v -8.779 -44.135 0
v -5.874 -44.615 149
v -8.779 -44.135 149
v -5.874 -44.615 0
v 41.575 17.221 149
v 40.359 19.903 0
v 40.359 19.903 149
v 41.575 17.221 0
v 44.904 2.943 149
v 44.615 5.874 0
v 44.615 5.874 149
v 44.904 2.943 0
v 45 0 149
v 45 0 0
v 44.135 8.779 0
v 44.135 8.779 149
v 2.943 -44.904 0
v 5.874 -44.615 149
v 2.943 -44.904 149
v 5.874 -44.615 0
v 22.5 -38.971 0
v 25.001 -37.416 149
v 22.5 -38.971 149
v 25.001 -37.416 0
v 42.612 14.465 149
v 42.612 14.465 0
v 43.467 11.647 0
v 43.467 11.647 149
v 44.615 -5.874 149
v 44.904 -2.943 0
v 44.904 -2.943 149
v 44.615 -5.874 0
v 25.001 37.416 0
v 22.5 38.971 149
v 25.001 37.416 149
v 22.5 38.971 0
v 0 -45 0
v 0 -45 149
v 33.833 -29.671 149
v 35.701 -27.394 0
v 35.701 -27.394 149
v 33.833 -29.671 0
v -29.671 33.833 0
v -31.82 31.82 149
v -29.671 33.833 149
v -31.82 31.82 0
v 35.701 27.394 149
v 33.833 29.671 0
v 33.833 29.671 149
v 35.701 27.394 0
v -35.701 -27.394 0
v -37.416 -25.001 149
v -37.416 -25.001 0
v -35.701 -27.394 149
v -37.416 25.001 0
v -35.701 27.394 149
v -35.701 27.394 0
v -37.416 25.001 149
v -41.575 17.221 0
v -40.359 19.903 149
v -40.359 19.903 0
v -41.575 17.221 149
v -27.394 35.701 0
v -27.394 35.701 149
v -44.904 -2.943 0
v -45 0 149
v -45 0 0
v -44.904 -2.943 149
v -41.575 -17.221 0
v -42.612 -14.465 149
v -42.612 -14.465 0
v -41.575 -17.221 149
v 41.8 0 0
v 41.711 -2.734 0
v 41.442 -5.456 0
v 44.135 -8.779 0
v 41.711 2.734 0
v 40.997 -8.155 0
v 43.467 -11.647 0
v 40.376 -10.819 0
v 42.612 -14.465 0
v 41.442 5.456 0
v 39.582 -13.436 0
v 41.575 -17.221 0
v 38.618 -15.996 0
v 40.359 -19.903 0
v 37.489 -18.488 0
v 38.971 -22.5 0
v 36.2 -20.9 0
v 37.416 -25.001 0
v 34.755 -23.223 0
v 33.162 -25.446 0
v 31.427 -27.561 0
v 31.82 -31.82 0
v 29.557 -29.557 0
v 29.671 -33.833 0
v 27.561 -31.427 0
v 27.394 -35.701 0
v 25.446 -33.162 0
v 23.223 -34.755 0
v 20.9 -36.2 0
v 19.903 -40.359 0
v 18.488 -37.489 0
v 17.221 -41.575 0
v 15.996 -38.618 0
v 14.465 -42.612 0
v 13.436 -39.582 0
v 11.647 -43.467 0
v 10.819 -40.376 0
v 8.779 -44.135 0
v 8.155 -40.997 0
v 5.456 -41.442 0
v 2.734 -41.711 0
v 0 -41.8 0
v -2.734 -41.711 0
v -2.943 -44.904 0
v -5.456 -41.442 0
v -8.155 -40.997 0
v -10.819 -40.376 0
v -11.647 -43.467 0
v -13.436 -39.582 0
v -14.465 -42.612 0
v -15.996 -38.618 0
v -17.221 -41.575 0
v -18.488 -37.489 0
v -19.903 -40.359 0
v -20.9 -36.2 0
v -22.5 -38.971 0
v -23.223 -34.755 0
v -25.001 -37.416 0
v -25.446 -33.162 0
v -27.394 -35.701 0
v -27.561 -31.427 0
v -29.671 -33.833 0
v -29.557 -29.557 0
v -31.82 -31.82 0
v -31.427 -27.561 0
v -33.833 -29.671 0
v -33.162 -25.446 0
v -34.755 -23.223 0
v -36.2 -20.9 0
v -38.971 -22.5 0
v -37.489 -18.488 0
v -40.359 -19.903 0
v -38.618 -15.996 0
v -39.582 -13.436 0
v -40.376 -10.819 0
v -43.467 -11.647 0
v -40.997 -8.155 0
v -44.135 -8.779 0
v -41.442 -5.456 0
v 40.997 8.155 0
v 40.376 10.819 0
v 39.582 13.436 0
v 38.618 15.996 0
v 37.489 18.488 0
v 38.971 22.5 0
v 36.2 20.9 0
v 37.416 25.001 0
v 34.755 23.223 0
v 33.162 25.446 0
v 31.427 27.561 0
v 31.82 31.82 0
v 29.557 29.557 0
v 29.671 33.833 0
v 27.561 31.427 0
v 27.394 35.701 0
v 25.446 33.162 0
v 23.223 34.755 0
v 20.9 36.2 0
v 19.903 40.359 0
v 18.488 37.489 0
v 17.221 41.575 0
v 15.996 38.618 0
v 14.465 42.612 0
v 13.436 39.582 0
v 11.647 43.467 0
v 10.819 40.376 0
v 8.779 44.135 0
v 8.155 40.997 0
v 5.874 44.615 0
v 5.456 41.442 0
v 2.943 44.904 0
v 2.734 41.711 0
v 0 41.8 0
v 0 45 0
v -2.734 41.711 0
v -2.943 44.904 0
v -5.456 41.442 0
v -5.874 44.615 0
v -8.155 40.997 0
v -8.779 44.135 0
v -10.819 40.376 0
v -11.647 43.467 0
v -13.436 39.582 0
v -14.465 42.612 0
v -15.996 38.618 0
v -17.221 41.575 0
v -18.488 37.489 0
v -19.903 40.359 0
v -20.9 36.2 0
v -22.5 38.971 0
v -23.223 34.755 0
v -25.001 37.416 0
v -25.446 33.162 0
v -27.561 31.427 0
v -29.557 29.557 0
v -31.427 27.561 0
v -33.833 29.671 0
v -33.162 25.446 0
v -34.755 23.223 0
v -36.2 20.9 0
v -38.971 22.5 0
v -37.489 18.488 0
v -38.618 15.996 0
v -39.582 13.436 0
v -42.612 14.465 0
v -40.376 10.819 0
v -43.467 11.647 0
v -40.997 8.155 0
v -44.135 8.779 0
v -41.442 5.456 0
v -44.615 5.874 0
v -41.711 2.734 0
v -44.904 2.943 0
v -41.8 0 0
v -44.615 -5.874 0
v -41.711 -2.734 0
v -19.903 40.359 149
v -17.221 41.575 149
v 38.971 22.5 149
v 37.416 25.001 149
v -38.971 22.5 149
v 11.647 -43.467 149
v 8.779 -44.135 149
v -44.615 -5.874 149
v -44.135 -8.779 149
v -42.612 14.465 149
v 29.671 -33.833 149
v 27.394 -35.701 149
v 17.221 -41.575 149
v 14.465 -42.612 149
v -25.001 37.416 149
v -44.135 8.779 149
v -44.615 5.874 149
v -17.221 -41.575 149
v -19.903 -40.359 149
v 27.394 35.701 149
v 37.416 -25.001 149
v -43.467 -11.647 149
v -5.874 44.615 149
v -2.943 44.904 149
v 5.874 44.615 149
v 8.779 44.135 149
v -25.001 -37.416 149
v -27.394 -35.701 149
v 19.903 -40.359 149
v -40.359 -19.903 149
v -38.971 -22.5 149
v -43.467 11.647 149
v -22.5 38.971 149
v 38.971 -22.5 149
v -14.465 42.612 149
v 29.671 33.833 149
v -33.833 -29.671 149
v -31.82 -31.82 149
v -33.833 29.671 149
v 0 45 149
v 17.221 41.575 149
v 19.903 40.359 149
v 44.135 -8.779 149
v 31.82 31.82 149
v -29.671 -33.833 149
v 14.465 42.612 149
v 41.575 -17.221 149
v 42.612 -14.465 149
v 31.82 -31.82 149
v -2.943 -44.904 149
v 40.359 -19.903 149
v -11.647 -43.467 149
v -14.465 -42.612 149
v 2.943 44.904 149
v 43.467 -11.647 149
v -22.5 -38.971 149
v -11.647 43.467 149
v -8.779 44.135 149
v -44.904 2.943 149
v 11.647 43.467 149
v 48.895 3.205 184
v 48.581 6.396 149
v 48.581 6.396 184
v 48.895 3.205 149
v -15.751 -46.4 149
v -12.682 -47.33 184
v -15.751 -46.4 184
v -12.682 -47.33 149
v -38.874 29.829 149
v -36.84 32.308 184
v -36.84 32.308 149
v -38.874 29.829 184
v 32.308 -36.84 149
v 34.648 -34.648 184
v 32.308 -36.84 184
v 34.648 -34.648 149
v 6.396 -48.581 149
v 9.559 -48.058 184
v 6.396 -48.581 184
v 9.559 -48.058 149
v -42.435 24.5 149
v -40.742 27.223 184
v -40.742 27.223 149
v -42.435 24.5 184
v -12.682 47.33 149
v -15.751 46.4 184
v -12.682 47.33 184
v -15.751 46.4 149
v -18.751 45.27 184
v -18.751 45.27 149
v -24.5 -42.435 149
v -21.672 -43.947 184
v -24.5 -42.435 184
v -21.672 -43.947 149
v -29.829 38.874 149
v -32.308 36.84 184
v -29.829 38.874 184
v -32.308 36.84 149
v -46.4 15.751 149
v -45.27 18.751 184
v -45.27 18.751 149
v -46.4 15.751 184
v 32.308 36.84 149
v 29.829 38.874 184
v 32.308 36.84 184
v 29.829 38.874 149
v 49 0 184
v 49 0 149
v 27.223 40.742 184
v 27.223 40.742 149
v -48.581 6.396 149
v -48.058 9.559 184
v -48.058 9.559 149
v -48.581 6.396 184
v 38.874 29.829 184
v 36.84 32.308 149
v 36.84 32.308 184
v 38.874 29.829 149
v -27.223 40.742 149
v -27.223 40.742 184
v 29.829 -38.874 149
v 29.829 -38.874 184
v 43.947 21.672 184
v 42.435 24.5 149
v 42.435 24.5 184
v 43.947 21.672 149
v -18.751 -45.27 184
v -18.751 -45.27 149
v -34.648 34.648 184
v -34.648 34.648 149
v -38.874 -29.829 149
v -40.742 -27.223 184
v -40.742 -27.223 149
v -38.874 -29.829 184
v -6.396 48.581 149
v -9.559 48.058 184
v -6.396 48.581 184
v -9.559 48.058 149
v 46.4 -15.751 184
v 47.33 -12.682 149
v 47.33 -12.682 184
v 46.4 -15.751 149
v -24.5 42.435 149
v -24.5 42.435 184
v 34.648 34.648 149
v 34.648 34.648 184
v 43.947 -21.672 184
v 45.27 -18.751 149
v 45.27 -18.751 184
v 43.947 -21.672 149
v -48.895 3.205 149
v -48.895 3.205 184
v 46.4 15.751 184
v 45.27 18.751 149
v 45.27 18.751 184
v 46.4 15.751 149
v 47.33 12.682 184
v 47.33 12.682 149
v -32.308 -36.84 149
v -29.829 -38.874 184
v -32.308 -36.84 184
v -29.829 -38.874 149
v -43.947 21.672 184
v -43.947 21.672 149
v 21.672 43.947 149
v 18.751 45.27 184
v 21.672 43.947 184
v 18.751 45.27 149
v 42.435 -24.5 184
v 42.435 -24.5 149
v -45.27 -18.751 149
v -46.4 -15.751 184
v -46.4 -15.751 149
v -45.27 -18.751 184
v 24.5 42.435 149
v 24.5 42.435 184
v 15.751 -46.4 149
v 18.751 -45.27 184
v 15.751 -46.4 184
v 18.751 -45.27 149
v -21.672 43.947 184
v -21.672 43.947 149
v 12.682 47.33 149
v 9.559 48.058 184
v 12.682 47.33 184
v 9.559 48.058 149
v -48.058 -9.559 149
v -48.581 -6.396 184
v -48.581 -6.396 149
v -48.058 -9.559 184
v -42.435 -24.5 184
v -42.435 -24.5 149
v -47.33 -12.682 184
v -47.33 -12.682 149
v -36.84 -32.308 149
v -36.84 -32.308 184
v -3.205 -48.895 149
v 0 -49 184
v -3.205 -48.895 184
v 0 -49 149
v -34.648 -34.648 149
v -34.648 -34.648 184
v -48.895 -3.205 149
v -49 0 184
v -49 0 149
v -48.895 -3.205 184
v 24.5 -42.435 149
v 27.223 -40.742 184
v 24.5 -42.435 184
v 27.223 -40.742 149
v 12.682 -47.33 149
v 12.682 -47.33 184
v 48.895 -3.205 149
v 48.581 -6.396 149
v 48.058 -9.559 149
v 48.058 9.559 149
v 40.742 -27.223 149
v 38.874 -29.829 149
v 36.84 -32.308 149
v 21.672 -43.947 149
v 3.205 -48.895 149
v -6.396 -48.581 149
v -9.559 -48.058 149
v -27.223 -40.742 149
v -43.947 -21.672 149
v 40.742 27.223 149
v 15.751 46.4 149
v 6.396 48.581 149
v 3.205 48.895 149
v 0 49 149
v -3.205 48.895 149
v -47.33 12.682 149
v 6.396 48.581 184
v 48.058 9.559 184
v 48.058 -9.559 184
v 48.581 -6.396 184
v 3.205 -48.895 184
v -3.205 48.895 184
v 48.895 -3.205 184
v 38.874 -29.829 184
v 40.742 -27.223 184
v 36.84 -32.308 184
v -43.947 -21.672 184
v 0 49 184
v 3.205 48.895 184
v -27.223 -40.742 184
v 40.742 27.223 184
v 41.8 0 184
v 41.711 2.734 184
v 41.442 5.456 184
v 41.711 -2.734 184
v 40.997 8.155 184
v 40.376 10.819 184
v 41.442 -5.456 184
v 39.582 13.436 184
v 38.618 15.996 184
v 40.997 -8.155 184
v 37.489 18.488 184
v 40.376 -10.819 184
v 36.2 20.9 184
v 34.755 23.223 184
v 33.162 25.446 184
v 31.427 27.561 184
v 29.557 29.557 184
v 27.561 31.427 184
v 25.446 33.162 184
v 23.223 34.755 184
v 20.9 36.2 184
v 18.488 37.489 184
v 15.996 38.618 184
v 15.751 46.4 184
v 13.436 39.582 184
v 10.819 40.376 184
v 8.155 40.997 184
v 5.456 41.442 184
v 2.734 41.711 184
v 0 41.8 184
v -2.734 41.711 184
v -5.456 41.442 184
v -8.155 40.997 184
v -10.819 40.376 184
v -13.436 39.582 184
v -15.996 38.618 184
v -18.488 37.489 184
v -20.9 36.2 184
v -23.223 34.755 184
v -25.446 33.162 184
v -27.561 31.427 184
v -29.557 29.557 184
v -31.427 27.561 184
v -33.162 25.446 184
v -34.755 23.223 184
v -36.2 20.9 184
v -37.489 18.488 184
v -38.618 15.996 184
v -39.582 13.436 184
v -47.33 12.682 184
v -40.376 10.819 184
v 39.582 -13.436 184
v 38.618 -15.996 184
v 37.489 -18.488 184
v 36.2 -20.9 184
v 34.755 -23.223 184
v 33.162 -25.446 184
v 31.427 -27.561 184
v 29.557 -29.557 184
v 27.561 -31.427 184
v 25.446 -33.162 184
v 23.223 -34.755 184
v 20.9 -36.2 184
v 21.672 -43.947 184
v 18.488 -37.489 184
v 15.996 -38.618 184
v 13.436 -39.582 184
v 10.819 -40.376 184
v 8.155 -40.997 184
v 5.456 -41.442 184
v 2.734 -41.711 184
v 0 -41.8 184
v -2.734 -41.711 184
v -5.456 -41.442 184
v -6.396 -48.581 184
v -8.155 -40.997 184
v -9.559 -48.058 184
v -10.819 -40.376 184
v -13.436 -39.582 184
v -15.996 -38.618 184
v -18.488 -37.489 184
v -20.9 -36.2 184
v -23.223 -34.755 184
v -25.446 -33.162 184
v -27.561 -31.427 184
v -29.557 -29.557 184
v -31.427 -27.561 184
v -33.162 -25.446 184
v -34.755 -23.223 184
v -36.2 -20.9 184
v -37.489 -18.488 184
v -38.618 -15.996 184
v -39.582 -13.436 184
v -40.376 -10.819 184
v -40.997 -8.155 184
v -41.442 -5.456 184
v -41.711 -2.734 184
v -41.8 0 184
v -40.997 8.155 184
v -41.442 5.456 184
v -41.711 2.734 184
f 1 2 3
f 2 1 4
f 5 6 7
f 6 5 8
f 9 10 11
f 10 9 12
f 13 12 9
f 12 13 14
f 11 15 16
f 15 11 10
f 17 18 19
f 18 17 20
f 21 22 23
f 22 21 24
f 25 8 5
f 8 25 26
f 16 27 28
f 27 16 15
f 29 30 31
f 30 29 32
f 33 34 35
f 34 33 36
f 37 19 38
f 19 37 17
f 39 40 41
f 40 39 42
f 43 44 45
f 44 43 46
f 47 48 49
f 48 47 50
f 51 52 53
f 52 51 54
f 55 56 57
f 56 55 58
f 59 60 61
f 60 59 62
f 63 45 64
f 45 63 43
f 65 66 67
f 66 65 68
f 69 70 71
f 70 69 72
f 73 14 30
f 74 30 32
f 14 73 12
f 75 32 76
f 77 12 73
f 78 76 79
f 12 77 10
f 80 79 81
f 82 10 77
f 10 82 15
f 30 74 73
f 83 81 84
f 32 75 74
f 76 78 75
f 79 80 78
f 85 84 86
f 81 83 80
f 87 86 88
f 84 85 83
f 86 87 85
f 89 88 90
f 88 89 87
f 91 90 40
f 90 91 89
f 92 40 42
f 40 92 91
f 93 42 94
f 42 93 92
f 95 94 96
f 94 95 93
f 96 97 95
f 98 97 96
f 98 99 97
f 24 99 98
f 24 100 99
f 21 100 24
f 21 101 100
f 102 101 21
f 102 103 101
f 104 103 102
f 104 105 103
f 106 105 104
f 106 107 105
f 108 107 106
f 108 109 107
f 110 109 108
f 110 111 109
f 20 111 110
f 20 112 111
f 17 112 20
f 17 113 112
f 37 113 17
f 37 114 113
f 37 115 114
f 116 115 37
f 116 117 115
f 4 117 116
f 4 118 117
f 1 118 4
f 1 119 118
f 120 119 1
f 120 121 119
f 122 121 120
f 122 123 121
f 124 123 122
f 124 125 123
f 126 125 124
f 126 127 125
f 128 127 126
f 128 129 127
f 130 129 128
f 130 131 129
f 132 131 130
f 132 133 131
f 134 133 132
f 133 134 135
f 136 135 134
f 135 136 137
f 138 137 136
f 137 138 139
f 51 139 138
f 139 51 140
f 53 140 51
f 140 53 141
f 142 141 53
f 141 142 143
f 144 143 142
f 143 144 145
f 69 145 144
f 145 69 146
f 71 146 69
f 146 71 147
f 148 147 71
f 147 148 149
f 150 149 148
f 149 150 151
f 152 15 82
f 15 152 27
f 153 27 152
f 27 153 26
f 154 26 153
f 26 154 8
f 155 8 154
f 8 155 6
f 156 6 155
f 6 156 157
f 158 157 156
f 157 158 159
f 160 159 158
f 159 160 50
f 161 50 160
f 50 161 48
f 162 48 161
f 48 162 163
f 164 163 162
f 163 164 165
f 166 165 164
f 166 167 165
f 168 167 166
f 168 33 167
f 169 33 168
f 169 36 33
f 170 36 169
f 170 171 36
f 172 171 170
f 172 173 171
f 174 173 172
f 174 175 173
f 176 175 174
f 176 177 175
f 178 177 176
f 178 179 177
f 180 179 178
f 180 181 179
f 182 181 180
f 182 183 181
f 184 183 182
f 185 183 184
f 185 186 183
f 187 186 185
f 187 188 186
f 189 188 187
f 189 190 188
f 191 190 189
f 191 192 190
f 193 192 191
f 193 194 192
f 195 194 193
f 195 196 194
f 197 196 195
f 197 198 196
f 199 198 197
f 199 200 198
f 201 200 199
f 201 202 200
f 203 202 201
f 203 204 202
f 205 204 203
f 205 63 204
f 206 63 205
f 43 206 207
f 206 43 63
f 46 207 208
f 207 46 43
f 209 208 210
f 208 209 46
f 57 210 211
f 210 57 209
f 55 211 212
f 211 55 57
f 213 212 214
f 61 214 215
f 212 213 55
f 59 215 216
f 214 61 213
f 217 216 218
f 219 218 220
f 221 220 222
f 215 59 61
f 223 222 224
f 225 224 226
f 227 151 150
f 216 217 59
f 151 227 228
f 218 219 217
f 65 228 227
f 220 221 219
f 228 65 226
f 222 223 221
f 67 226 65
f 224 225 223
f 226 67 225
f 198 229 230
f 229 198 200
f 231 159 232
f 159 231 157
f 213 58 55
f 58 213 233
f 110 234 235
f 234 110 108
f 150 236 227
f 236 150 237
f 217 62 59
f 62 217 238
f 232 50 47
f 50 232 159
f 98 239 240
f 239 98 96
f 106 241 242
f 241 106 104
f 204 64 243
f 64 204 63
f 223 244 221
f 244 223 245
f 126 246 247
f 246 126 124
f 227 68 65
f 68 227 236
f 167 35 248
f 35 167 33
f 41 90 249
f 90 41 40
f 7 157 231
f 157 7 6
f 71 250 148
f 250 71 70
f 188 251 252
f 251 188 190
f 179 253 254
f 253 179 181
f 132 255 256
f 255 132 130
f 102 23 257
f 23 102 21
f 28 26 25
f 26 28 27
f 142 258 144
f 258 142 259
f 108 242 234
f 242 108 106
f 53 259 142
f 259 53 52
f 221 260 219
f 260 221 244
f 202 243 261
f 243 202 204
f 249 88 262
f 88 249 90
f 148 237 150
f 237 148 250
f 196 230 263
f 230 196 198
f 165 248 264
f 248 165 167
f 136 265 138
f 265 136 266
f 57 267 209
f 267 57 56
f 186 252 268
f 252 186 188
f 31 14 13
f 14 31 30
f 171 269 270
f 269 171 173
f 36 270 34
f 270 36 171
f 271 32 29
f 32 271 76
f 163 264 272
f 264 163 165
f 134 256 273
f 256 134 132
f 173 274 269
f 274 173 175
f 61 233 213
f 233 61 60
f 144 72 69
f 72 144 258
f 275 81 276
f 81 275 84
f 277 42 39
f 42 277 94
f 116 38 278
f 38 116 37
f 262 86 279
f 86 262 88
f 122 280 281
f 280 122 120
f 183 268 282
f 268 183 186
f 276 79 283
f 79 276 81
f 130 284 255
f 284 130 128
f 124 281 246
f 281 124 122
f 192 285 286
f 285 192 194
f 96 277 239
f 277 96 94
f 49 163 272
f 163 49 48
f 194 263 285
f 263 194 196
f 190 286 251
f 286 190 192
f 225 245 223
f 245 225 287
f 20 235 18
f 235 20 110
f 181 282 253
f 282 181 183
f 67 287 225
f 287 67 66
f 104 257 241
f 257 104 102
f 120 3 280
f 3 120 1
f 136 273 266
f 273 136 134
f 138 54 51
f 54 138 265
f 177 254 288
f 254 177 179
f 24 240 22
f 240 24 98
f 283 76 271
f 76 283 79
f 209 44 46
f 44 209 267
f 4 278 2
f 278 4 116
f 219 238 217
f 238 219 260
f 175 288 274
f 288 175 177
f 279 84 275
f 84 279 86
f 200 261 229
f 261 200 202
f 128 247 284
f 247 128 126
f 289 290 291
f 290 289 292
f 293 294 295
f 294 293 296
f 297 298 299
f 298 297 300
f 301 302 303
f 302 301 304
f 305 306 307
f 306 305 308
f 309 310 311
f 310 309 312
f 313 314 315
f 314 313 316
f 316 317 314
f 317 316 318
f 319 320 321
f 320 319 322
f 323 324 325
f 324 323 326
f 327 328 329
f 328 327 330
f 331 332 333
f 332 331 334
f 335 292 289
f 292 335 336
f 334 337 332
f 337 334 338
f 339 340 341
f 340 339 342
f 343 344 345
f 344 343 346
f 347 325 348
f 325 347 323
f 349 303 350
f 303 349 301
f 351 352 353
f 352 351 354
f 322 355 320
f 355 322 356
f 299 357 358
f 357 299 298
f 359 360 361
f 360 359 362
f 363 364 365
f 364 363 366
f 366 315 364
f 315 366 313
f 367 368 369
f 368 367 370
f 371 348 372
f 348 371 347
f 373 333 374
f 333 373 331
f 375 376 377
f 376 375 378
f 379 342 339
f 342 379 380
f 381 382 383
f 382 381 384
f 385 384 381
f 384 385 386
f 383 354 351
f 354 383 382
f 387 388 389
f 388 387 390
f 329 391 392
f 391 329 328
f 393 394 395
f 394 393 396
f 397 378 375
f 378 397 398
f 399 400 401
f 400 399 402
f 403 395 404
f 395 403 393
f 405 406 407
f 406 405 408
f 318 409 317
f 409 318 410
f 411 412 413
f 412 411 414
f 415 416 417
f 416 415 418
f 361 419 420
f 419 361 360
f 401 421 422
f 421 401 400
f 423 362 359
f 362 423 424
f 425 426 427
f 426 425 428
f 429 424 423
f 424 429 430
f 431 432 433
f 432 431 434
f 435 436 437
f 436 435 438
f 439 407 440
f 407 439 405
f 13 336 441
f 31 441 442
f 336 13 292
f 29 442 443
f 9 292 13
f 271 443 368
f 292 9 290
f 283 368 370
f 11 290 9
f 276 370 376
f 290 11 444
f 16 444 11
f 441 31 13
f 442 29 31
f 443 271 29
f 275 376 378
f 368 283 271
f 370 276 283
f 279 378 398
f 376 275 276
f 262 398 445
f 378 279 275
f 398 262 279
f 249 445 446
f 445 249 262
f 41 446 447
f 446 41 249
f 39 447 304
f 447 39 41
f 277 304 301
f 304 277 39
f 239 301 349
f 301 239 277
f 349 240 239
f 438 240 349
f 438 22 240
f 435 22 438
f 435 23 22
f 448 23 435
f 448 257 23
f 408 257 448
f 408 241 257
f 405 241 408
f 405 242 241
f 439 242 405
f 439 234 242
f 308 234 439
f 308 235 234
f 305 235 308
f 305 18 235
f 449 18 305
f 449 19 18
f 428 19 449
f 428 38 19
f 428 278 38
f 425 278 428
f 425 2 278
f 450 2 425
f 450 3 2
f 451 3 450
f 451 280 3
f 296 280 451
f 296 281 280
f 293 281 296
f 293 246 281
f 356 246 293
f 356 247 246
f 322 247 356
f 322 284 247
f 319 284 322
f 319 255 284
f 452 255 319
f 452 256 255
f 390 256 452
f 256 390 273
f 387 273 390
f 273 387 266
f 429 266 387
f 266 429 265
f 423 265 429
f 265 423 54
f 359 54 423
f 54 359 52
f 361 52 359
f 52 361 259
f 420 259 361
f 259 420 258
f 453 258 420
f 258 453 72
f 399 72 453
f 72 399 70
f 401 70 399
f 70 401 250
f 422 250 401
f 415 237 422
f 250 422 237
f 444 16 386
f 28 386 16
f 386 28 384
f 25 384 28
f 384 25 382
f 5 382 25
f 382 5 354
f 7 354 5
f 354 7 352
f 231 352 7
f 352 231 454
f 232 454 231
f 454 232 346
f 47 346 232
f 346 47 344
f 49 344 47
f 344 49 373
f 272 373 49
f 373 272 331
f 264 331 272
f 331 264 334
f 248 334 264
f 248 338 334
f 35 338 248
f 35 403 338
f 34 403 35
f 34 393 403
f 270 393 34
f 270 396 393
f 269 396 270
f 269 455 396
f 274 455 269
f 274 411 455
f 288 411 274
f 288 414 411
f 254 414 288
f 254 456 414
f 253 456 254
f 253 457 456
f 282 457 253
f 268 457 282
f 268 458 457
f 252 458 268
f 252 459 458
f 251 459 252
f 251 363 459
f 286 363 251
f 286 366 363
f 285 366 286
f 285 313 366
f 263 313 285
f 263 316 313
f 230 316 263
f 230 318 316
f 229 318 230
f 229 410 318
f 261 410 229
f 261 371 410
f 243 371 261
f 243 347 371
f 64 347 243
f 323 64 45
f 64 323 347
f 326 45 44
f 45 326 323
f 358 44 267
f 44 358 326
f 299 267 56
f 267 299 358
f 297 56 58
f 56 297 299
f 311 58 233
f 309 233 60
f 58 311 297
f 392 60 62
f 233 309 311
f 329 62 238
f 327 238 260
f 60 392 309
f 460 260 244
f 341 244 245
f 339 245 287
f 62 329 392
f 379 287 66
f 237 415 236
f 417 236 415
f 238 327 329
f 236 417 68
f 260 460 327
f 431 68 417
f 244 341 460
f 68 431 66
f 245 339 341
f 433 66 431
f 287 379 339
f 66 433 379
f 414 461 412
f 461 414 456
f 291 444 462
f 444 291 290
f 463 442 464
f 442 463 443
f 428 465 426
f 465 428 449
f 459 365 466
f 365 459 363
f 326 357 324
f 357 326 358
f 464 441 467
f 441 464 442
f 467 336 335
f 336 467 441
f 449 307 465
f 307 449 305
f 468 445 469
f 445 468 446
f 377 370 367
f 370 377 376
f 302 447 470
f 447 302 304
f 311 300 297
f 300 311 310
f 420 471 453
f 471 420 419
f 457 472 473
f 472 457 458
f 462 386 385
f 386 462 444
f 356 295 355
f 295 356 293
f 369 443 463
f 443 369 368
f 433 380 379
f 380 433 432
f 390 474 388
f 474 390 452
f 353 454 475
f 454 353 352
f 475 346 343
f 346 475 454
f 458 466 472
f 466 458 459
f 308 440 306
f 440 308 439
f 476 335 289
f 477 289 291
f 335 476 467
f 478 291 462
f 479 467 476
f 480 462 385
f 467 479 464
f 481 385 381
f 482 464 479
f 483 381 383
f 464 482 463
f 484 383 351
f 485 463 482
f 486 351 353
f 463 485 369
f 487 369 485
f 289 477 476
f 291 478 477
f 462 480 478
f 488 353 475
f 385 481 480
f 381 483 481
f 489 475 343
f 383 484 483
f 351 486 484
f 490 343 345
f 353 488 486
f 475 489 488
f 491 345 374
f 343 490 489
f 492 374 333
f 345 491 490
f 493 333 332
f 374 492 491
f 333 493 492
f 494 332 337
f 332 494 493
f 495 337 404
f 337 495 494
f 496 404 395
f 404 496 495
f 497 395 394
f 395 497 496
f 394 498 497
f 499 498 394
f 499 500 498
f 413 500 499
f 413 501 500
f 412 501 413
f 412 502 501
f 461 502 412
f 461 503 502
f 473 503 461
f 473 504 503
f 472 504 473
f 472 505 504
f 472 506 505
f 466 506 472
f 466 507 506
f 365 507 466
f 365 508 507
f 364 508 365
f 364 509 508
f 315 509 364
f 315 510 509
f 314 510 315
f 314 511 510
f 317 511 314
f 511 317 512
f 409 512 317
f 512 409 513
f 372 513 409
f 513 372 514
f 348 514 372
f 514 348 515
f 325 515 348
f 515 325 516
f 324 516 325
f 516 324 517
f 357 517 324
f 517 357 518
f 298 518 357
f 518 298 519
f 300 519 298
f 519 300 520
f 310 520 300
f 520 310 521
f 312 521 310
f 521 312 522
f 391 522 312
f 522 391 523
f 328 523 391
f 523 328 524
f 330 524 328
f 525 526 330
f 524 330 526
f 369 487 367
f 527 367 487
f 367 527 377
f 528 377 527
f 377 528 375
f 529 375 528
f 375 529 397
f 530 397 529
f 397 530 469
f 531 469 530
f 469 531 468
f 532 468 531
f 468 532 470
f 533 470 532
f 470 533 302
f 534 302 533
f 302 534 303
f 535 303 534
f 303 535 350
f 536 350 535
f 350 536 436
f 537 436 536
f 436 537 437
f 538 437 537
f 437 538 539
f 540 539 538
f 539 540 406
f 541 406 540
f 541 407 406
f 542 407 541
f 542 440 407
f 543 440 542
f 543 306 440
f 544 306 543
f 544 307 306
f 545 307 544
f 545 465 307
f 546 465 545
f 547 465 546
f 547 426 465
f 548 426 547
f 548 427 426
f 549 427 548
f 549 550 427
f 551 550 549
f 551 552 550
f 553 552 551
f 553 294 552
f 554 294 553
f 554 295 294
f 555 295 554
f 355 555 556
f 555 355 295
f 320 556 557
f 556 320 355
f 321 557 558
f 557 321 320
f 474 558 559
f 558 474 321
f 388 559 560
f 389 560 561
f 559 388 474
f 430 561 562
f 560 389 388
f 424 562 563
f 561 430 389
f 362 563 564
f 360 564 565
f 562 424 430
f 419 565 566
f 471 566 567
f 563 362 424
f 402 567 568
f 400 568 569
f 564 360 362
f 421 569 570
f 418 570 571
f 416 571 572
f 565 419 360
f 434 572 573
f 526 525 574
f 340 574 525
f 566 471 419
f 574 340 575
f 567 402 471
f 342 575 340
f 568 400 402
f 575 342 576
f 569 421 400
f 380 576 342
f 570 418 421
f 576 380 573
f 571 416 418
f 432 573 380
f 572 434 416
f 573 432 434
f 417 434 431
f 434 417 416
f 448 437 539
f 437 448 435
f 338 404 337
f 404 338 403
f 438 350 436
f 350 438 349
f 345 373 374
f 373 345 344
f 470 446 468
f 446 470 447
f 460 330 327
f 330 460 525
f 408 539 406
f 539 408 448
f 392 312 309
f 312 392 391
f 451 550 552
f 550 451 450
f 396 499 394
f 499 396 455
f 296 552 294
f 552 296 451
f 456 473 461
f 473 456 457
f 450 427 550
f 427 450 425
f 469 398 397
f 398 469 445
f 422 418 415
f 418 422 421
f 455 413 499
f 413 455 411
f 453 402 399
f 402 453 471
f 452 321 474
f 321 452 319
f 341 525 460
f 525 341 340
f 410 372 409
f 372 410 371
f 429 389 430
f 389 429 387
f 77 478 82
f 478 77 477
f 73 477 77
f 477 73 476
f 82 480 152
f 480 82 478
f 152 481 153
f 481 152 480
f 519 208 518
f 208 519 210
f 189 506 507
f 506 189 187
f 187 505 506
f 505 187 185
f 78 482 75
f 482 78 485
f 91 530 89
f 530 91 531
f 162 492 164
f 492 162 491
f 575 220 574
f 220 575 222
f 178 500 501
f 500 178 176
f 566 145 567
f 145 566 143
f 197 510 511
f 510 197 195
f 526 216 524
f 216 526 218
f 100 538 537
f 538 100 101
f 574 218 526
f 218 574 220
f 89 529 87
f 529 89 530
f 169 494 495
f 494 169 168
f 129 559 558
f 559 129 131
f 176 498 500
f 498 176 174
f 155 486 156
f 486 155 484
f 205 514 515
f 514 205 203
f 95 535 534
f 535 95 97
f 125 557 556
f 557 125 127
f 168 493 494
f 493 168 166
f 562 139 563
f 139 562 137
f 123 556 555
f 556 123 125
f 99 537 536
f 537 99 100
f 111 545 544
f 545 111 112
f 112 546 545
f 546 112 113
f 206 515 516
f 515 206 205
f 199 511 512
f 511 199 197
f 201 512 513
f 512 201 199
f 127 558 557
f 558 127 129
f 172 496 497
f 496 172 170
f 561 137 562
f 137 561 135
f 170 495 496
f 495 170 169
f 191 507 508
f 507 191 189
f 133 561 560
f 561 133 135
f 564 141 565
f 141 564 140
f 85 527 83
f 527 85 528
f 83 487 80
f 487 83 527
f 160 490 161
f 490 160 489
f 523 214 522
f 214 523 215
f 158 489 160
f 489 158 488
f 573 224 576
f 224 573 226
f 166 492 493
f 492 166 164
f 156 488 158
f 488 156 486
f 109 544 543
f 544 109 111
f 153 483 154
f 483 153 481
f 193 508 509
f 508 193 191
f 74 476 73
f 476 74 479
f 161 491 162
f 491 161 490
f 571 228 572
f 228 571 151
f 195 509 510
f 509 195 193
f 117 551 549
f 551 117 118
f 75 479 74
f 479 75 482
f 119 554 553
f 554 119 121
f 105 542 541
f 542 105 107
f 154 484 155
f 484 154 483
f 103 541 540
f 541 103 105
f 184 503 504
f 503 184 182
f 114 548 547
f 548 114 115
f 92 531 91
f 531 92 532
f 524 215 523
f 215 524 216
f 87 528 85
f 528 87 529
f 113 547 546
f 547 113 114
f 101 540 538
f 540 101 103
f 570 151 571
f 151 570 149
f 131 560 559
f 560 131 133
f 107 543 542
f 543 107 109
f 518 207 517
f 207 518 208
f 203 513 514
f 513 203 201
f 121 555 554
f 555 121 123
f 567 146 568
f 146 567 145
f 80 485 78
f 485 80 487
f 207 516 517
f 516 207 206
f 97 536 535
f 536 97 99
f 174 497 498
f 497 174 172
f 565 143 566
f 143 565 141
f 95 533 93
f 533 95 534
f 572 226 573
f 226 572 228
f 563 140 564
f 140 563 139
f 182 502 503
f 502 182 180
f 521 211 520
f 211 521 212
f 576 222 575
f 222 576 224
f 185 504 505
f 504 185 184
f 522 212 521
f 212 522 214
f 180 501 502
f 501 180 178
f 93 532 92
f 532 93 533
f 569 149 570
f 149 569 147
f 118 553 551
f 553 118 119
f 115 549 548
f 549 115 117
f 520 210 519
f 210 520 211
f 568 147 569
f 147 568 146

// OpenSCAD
// HT 90 pipe 150 mm (single connected solid, hollow, with one socket end)

// Parameters
nominal_diameter = 90; //[45:180:1]
length_mm = 150;       //[75:300:1]
od_mm = 90;            //[45:180:1]
wall_mm = 3.2;         //[1.6:6.4:0.1]
fitting_len_mm = 35;   //[18:70:1]
fitting_radial_add_mm = 4; //[2:8:0.5]
connect_overlap_mm = 1;     //[0.5:2:0.1]

$fn = 96;

module ht_pipe() {
  outer_r = od_mm/2;
  inner_r = max(0.01, outer_r - wall_mm);

  // Small epsilon to avoid coplanar faces
  eps = 0.02;

  // Ensure overlap is valid and creates a connected sleeve
  overlap = min(connect_overlap_mm, fitting_len_mm - eps);

  // Sleeve starts at the pipe end and extends outward, overlapping into the pipe
  sleeve_z0 = length_mm - overlap;
  sleeve_h  = fitting_len_mm;

  // Inner bores: open at both ends (typical pipe), so no bottom "cap"
  // Main bore runs full length; sleeve bore runs full sleeve length.
  color([0.85, 0.85, 0.8])
  difference() {
    // OUTER SOLID (pipe + sleeve), unioned so it's one connected body
    union() {
      cylinder(h=length_mm, r=outer_r, center=false);

      translate([0, 0, sleeve_z0])
        cylinder(h=sleeve_h, r=outer_r + fitting_radial_add_mm, center=false);
    }

    // INNER VOID (continuous through), unioned
    union() {
      // Main bore (open both ends)
      translate([0, 0, -eps])
        cylinder(h=length_mm + 2*eps, r=inner_r, center=false);

      // Sleeve bore (open at far end)
      translate([0, 0, sleeve_z0 - eps])
        cylinder(h=sleeve_h + 2*eps, r=inner_r, center=false);
    }
  }
}

ht_pipe();
